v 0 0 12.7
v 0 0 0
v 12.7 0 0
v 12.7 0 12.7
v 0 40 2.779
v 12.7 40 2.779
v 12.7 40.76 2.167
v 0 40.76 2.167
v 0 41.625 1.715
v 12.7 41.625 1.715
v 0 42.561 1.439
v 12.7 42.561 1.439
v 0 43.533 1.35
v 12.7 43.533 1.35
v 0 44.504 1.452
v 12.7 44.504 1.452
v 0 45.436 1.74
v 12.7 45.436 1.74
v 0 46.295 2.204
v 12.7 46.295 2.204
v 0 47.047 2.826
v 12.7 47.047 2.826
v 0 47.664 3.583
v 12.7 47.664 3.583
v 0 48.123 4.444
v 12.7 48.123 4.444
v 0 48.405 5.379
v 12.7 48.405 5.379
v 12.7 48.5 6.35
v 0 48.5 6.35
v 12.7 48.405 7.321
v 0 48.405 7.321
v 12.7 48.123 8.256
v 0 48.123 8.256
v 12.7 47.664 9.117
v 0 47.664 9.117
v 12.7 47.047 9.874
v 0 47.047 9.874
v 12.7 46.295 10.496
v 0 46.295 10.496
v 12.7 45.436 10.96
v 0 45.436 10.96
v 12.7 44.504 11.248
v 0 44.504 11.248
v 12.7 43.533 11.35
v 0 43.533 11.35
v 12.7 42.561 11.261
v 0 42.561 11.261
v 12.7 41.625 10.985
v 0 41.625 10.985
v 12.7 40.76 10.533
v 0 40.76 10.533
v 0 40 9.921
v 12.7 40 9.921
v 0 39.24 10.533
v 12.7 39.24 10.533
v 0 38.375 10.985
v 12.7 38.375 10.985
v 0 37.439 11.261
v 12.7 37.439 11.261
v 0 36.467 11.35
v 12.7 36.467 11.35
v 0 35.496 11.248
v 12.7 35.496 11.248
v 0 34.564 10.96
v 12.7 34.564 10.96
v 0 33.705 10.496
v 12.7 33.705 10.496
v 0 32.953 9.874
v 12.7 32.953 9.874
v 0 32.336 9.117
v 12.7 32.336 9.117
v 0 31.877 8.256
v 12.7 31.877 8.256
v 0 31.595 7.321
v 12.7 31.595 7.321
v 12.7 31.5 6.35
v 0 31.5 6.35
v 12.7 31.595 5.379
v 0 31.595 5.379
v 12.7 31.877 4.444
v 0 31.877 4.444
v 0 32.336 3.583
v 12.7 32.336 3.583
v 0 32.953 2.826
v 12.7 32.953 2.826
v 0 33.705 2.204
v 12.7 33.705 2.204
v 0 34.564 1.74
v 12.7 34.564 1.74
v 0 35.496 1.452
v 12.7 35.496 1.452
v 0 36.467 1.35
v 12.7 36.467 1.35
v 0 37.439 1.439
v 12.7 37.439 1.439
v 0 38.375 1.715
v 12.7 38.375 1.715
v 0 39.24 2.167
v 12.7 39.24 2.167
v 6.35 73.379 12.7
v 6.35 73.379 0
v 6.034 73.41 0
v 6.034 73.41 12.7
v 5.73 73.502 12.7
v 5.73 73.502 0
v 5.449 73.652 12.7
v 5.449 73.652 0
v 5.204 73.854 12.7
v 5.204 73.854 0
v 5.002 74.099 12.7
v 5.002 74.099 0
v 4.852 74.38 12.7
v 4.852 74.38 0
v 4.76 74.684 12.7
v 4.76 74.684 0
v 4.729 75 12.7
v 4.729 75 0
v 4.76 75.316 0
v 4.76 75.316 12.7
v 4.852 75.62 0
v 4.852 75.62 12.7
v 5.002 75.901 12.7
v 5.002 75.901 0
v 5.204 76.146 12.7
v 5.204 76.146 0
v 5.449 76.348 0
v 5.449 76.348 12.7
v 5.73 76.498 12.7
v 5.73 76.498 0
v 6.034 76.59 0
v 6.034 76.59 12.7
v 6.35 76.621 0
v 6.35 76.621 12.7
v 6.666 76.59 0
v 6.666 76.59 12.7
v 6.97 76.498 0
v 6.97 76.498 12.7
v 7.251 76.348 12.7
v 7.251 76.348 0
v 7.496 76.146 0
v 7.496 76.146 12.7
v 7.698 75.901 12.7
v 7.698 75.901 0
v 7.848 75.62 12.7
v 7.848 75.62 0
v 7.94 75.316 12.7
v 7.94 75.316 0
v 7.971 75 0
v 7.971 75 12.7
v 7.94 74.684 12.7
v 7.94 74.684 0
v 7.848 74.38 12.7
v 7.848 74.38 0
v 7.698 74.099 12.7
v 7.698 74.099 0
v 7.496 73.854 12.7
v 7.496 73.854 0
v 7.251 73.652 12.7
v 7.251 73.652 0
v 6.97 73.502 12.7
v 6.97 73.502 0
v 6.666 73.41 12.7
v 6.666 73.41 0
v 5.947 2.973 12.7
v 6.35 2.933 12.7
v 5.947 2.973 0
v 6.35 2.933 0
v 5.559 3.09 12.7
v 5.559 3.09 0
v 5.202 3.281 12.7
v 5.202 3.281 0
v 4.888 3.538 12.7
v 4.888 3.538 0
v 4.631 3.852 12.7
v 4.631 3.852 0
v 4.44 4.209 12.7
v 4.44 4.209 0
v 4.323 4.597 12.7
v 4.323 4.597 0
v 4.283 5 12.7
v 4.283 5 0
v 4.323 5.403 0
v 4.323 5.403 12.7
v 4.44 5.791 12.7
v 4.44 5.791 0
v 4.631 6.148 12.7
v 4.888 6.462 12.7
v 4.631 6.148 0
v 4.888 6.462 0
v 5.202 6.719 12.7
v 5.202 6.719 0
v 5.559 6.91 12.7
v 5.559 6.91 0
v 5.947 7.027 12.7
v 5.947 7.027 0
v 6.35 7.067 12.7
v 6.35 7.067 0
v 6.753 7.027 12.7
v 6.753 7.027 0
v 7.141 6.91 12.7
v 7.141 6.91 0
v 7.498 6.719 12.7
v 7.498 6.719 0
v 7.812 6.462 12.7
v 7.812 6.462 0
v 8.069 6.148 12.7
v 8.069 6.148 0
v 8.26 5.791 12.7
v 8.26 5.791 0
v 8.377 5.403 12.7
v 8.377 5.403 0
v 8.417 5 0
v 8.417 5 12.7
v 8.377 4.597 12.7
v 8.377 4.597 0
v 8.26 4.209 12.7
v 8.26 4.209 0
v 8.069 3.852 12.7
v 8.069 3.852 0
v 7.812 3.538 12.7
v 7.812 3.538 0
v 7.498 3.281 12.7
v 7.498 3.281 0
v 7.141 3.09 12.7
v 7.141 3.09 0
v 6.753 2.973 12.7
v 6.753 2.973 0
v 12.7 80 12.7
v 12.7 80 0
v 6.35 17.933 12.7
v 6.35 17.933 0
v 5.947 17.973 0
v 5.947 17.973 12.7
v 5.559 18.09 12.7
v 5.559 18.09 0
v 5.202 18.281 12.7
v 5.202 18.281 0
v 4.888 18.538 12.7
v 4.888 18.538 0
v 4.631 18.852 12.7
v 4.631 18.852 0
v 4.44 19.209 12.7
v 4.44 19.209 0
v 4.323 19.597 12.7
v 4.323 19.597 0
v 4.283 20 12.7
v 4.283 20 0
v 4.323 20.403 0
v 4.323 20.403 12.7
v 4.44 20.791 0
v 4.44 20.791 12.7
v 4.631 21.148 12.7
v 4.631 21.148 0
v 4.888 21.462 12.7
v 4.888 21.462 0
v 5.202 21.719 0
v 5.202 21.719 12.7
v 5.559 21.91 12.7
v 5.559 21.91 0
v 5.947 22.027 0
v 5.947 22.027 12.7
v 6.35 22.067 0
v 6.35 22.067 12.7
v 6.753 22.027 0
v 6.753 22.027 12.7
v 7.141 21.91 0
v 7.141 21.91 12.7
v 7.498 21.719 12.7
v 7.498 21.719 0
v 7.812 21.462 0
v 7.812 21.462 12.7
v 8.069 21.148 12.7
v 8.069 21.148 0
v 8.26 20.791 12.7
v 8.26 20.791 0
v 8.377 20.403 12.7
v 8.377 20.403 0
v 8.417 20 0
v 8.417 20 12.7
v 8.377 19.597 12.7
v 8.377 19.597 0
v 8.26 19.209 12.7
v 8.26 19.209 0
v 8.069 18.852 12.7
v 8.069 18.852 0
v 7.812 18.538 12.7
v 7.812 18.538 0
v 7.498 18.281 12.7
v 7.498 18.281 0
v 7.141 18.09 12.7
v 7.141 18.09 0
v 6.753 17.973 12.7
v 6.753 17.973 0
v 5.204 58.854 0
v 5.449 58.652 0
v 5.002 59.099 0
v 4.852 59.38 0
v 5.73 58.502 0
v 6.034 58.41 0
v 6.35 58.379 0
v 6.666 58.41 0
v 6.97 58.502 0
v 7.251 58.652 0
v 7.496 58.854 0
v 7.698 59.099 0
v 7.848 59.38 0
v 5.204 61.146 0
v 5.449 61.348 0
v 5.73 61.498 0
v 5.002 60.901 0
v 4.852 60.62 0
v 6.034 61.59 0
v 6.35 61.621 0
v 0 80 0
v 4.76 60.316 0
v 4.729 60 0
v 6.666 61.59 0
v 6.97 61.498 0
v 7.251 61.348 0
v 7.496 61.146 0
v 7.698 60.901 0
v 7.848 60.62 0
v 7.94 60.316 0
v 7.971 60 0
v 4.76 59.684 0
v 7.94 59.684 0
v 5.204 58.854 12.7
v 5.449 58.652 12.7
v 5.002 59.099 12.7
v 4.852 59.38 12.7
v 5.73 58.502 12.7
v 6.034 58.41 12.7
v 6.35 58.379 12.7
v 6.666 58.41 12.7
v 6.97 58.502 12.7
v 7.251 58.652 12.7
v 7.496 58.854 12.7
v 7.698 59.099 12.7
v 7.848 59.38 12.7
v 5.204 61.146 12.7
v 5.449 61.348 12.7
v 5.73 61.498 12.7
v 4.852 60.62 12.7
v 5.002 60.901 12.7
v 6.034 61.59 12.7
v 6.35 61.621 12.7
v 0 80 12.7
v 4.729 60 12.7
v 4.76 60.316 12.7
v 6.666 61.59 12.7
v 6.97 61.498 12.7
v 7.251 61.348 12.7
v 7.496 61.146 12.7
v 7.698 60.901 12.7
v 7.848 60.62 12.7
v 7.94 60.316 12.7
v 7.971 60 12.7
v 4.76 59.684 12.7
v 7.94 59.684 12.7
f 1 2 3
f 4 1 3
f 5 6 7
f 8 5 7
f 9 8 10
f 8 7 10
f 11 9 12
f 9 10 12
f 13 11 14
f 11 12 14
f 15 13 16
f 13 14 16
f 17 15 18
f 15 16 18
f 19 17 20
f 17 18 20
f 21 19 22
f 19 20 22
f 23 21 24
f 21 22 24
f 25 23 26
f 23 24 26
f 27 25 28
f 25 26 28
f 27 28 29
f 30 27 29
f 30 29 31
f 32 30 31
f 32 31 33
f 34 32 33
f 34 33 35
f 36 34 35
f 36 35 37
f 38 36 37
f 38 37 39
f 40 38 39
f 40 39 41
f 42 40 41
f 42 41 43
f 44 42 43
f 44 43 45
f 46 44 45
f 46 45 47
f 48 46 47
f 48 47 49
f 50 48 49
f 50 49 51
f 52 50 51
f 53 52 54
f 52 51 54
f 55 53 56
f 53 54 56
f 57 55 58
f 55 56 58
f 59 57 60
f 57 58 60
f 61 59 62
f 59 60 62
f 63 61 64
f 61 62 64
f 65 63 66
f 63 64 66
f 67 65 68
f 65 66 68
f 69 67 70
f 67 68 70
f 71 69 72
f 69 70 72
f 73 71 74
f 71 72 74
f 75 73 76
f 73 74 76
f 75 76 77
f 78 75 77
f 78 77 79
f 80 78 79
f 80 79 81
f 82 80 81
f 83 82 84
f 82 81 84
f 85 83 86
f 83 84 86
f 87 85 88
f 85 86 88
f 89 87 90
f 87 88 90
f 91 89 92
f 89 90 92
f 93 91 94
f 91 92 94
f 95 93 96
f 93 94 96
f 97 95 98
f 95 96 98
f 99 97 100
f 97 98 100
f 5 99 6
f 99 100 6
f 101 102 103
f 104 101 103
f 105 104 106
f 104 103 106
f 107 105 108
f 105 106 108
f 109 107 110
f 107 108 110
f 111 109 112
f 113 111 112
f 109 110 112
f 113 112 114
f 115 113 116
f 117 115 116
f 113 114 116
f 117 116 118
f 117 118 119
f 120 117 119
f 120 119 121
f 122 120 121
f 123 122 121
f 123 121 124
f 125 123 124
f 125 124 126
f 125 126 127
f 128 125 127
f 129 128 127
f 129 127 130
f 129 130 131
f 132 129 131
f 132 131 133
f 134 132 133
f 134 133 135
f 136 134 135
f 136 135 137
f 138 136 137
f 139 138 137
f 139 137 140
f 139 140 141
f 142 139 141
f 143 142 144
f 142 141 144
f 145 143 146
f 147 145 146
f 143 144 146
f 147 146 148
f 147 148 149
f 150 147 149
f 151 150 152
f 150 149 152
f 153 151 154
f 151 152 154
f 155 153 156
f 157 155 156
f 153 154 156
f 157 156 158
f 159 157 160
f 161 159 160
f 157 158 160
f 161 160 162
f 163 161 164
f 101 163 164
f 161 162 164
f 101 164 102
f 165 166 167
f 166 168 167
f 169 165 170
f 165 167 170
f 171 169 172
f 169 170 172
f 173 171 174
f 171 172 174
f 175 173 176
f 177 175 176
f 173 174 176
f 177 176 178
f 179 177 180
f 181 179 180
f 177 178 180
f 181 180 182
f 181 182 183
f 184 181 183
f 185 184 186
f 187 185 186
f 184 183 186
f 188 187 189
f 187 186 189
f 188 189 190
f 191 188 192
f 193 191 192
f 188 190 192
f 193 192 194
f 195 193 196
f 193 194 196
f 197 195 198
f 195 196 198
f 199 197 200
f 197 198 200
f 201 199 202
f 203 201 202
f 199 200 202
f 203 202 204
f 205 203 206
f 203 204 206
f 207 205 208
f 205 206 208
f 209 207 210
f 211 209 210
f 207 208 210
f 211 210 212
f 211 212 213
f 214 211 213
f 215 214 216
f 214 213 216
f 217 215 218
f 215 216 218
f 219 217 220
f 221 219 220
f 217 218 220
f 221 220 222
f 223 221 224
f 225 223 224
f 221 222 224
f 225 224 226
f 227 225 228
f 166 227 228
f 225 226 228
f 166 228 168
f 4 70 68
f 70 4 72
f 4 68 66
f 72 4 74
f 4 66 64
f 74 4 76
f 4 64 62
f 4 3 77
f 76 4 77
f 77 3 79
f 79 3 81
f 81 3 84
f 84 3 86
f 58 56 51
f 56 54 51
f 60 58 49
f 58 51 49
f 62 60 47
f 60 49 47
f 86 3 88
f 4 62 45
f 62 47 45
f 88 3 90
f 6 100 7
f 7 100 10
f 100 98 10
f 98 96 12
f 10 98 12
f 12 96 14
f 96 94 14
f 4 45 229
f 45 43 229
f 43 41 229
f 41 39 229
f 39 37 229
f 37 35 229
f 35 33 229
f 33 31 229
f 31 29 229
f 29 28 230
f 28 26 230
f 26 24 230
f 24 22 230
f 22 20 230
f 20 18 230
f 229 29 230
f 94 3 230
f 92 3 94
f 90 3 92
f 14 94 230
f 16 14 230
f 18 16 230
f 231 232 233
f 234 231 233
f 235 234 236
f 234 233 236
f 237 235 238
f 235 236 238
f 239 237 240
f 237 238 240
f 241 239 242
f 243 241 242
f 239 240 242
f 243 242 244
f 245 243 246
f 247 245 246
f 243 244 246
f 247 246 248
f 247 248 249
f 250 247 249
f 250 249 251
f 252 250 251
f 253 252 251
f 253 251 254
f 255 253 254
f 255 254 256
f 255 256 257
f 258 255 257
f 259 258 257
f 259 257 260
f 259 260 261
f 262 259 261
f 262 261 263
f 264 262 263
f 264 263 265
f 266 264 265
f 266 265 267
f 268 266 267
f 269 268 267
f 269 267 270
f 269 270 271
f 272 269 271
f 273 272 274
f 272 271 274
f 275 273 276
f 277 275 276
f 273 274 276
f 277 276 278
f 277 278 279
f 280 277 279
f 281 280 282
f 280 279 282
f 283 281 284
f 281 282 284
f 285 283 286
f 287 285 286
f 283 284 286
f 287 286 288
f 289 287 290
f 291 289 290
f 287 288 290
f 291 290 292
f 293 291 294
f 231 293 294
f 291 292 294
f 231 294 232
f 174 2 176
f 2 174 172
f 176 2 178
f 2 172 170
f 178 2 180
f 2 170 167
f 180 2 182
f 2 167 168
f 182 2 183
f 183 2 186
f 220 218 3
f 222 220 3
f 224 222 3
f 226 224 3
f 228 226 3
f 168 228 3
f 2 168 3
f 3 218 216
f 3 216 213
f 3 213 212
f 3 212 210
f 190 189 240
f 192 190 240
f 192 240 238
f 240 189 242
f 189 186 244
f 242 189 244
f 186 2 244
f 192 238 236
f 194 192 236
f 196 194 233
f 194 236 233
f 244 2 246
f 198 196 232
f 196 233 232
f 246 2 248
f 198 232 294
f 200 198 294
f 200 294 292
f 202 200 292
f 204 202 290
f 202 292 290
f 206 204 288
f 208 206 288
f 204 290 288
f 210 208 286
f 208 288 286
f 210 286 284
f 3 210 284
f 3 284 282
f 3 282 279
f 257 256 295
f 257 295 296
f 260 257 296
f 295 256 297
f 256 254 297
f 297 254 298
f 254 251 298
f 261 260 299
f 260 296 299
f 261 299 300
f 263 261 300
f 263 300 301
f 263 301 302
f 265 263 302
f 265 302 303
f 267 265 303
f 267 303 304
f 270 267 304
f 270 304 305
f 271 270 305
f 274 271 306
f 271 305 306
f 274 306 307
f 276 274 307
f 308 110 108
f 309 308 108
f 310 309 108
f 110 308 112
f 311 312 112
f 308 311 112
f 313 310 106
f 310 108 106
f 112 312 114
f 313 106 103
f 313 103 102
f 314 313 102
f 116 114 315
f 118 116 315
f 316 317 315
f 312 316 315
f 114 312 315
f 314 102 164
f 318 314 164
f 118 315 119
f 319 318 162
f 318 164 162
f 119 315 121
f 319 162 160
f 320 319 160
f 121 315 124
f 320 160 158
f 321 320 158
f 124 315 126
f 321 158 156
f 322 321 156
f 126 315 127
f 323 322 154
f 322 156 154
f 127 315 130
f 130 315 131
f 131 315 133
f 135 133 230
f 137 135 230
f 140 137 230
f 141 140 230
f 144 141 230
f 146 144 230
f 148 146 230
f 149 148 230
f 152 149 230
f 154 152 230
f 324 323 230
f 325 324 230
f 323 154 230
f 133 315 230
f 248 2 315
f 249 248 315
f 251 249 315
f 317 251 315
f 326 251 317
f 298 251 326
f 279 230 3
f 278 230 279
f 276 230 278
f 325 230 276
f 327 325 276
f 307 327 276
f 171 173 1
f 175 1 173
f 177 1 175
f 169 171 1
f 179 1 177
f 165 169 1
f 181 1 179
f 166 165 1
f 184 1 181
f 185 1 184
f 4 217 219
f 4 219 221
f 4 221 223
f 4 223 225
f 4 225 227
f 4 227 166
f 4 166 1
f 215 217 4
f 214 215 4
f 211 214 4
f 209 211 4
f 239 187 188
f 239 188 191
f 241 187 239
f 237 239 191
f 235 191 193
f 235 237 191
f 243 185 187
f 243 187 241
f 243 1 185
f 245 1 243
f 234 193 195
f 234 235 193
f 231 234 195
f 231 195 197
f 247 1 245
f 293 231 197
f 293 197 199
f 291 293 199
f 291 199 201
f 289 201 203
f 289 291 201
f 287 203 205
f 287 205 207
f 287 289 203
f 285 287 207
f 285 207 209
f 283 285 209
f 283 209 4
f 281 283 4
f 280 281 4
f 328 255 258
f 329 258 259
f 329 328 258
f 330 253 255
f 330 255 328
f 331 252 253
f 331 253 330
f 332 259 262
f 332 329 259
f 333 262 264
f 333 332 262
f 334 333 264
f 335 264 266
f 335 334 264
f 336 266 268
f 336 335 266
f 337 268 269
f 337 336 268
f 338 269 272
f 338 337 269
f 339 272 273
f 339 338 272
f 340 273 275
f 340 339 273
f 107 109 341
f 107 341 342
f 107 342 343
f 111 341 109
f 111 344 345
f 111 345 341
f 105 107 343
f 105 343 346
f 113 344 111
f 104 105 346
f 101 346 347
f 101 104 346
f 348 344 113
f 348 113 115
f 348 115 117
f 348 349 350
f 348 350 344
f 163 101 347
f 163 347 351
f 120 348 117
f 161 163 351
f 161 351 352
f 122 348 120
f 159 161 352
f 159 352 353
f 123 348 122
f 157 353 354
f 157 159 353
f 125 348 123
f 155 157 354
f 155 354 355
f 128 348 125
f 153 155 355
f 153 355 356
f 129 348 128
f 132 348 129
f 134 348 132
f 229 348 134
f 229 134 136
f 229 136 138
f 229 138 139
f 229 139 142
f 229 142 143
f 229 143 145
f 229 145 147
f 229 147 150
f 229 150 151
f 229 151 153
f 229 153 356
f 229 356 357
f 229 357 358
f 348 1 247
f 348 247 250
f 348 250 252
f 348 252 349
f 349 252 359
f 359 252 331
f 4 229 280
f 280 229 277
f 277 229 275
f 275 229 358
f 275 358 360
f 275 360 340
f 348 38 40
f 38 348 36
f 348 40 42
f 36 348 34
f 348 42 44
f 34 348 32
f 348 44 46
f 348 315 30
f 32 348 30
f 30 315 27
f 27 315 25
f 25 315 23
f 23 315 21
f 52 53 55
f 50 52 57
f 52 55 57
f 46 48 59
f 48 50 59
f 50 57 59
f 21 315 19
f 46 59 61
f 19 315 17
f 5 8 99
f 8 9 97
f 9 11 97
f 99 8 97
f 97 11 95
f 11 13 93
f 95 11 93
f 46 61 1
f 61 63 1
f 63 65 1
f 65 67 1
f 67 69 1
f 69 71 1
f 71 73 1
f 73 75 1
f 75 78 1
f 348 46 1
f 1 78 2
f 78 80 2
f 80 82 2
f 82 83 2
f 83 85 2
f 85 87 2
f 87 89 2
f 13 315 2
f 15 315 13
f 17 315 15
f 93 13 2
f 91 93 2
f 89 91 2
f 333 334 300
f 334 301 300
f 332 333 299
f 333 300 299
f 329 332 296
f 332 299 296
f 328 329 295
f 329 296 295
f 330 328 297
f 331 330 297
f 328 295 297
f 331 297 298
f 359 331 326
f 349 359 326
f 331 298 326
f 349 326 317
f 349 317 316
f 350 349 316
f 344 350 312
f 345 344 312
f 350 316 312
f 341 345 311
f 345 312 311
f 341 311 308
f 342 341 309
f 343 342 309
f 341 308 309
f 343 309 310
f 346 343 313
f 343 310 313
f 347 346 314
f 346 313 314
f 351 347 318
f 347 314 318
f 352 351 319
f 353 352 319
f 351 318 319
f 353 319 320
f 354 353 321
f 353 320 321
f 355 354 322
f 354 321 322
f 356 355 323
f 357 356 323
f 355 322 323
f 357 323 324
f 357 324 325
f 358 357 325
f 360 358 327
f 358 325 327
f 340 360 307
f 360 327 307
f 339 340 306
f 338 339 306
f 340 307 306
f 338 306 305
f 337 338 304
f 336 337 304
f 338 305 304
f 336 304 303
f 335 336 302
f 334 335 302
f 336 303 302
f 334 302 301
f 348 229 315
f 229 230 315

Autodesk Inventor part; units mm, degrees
ref_plane "YZ Plane" through (0, 0, 0) normal (1, 0, 0) x (0, 1, 0)
ref_plane "XZ Plane" through (0, 0, 0) normal (0, 1, 0) x (-1, 0, 0)
ref_plane "XY Plane" through (0, 0, 0) normal (0, 0, 1) x (1, 0, 0)
sketch "Skizze1" plane through (0, 0, 0) normal (0, 0, 1) x (1, 0, 0)
  line L0 (0, 0) -> (12.7, 0)
  line L1 (12.7, 0) -> (12.7, 80)
  line L2 (12.7, 80) -> (0, 80)
  line L3 (0, 80) -> (0, 0)
  dimension "d0" = 12.7
  dimension "d1" = 80
extrude "Extrusion1" add sketch "Skizze1" along normal blind 12.7
sketch "Skizze2" plane through (0, 0, 12.7) normal (0, 0, 1) x (1, 0, 0)
  line L0 (0, 0) -> (12.7, 0) projected
  line L1 (6.35, 0) -> (5, 0)
  line L2 (5, 0) -> (5, 5)
  line L3 (5, 5) -> (6.35, 5)
  line L4 (6.35, 5) -> (6.35, 0)
  line L5 (6.35, 5) -> (2, 5)
  line L6 (2, 5) -> (2, 20)
  line L7 (2, 20) -> (6.35, 20)
  line L8 (6.35, 20) -> (6.35, 5)
  dimension "d4" = 5
  dimension "d5" = 15
hole "Bohrung1" at (6.35, 5, 12.7) at (6.35, 20, 12.7) direction (0, 0, -1) diameter 4.134 end through all thread size "M5x0.8" class "6H" standard "ISO Metric profile"
sketch "Skizze3" plane through (0, 0, 12.7) normal (0, 0, 1) x (1, 0, 0)
  line L0 (12.7, 80) -> (0, 80) projected
  line L1 (6.35, 80) -> (4, 80)
  line L2 (4, 80) -> (4, 75)
  line L3 (4, 75) -> (6.35, 75)
  line L4 (6.35, 75) -> (6.35, 80)
  line L5 (6.35, 75) -> (4, 75)
  line L6 (4, 75) -> (4, 60)
  line L7 (4, 60) -> (6.35, 60)
  line L8 (6.35, 60) -> (6.35, 75)
  point P0 (0, 0)
  dimension "d13" = 5
  dimension "d14" = 15
hole "Bohrung2" at (6.35, 60, 12.7) at (6.35, 75, 12.7) direction (0, 0, -1) diameter 3.242 end through all thread size "M4x0.7" class "6H" standard "ISO Metric profile"
sketch "Skizze4" plane through (12.7, 0, 0) normal (1, 0, 0) x (0, 0, -1)
  line L0 (0, 0) -> (-12.7, 0) projected
  line L1 (-12.7, 0) -> (-12.7, 80) projected
  line L2 (-6.35, 0) -> (-12.7, 0)
  line L3 (-12.7, 0) -> (-12.7, 40)
  line L4 (-12.7, 40) -> (-6.35, 40)
  line L5 (-6.35, 40) -> (-6.35, 0)
  line L6 (-6.35, 36.5) -> (-6.35, 43.5)
  line L7 (-6.35, 43.5) -> (-6.35, 36.5)
  circle A0 centre (-6.35, 36.5) radius 5
  circle A1 centre (-6.35, 43.5) radius 5
  point P0 (-6.35, 40)
  dimension "d22" = 7
  dimension "d23" = 10
  dimension "d24" = 10
extrude "Extrusion2" cut sketch "Skizze4" against normal through all contours A0 A1 L5 | L5 A1 A0 | A0 L6 L4 | A1 A0 | L4 L5 A1 | L5 L6 A0 A1
equation "\"d24\" = d23"
properties part number "LoadCell"
